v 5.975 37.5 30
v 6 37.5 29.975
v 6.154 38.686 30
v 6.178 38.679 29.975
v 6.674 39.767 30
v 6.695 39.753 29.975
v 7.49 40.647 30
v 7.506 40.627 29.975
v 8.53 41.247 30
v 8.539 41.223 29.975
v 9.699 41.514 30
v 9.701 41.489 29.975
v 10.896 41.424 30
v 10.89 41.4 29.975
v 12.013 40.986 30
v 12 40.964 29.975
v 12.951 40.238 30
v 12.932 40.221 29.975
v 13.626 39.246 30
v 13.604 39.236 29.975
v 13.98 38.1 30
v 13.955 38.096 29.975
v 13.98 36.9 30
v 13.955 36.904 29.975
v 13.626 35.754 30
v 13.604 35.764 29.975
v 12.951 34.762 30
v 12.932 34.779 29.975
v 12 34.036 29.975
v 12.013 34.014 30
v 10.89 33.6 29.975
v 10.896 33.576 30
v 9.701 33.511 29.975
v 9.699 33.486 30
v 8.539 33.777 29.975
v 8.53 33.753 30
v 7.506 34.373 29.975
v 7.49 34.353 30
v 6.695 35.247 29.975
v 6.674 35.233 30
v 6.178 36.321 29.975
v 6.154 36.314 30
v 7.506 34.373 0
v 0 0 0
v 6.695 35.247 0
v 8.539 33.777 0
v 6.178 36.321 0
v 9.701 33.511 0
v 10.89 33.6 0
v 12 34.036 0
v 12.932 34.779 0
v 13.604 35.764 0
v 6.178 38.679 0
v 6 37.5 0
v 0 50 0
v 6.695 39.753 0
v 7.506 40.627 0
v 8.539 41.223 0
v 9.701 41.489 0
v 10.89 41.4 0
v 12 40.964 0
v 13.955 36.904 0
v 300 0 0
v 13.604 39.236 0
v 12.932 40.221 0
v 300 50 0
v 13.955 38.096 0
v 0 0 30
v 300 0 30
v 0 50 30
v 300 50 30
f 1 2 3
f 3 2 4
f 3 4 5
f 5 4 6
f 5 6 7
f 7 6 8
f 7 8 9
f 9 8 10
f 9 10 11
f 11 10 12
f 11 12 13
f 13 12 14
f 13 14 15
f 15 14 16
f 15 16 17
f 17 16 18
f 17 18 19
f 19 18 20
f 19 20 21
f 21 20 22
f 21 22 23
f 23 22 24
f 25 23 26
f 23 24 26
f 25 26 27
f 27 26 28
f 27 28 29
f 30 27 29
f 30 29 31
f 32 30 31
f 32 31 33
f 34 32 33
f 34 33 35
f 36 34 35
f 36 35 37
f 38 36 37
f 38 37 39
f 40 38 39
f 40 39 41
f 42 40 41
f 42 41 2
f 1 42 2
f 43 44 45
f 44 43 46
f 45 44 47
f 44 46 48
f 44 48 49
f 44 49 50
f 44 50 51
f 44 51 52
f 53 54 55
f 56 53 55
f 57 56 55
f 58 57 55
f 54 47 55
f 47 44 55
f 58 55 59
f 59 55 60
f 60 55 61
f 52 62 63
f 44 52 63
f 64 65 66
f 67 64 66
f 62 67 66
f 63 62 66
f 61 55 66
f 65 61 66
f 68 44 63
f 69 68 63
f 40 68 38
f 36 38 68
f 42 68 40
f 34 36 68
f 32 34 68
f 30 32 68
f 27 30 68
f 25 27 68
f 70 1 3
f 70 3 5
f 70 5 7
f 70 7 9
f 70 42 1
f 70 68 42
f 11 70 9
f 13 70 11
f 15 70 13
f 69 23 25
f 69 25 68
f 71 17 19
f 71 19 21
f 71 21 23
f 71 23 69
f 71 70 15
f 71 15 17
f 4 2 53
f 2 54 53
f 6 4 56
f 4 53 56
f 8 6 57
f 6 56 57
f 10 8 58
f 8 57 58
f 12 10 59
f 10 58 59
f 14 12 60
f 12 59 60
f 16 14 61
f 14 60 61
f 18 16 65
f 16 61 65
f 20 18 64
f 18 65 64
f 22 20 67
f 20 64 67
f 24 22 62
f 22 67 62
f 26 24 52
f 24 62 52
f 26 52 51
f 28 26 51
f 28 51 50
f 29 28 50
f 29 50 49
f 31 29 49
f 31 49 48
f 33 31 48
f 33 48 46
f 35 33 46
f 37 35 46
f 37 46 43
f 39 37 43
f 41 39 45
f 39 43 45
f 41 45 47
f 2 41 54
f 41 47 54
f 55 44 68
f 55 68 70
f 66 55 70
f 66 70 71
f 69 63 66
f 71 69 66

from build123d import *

# Parameters (mm, degrees)
SKETCH1_W                       = 300
SKETCH1_H                       = 50
BOSS_EXTRUDE1_DEPTH             = 30
F_8_0MM_DOWEL_HOLE1_D           = 8
F_8_0MM_DOWEL_HOLE1_CSINK_D     = 8.05
F_8_0MM_DOWEL_HOLE1_CSINK_ANGLE = 90


with BuildPart() as part:
    # Sketch1 → Boss-Extrude1 (new body)
    with BuildSketch(Plane.XY):
        with Locations((150, 25)):
            Rectangle(SKETCH1_W, SKETCH1_H)
    extrude(amount=BOSS_EXTRUDE1_DEPTH)

    # Ø8.0mm Dowel Hole1 (through all)
    with Locations(Plane.XY.offset(30)):
        with Locations((10, 37.5)):
            CounterSinkHole(F_8_0MM_DOWEL_HOLE1_D / 2, F_8_0MM_DOWEL_HOLE1_CSINK_D / 2, counter_sink_angle=F_8_0MM_DOWEL_HOLE1_CSINK_ANGLE)


solid = part.part
